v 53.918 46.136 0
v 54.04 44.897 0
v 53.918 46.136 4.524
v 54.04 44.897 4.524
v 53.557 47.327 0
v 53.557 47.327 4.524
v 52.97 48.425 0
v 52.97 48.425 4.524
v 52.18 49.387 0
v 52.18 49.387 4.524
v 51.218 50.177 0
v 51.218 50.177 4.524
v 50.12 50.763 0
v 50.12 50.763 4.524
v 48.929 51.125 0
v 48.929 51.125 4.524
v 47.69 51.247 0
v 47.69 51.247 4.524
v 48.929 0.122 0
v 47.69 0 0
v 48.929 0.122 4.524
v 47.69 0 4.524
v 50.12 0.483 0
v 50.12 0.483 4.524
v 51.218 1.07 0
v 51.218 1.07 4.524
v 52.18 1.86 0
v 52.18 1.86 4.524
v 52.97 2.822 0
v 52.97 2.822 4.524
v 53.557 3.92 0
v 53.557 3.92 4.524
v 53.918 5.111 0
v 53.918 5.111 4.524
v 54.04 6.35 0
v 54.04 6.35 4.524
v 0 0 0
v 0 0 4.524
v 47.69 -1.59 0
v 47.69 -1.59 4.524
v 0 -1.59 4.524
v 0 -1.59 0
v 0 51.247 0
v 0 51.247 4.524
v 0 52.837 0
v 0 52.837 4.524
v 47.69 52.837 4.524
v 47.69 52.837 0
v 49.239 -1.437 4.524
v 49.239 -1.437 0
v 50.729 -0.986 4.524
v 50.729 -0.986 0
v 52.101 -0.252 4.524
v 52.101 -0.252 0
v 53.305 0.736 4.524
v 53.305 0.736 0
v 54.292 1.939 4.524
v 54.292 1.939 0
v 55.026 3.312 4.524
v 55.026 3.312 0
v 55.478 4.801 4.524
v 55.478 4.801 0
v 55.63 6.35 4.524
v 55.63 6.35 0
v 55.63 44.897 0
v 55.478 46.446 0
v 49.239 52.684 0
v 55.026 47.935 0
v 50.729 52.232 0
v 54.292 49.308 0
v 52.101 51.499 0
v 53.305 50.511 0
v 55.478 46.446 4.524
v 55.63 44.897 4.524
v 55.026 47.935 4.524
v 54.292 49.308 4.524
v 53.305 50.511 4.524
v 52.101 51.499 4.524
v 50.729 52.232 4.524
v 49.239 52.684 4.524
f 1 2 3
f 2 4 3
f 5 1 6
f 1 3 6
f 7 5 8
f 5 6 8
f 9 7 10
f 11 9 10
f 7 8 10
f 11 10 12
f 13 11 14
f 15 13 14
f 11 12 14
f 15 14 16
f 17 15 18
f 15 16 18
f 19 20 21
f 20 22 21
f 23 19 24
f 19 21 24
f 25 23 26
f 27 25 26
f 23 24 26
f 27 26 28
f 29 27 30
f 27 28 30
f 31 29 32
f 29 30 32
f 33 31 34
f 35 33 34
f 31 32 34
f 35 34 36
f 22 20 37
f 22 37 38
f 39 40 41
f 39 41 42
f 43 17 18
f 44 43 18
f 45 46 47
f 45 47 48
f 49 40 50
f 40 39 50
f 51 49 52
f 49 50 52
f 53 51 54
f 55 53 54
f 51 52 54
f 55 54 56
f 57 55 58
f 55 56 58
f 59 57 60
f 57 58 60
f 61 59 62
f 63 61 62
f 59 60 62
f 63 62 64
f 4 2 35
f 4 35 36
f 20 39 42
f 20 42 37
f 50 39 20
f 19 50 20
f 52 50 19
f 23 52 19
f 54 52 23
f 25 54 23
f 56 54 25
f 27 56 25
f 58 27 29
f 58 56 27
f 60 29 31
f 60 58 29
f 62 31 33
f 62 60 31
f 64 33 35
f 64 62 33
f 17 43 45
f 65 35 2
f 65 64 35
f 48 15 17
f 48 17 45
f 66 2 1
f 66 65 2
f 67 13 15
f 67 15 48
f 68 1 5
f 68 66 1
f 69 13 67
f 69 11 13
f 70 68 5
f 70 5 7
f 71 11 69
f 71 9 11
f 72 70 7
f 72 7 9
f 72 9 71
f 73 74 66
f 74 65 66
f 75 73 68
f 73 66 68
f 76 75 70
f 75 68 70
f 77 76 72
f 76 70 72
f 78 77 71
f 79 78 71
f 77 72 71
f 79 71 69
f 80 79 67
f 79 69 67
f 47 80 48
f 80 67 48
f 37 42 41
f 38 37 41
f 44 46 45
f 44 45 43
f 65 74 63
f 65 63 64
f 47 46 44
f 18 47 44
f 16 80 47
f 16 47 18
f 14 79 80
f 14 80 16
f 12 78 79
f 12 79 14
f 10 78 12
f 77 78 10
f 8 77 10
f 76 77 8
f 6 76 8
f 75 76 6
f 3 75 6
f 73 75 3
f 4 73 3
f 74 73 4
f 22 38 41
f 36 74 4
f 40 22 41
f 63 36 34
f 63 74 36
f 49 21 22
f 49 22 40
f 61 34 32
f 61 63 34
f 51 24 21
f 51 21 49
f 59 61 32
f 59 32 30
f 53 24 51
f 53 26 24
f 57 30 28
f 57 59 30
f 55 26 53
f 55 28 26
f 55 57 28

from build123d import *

# Parameters (mm, degrees)
F1_W = 1.589909
F1_H = 4.523729


with BuildPart() as f2:
    # F2: sweep along a path in F0
    with BuildLine(Plane.XY) as f2_path:
        Line((0, 0), (47.690287, 0))
        ThreePointArc((47.690287, 0), (52.180415, 1.859872), (54.040287, 6.35))
        Line((54.040287, 6.35), (54.040287, 44.896792))
        ThreePointArc((54.040287, 44.896792), (52.180415, 49.38692), (47.690287, 51.246792))
        Line((47.690287, 51.246792), (0, 51.246792))
    # F1 (on Right) → F2 (sweep)
    with BuildSketch(Plane.YZ):
        with Locations((-0.794955, 2.261864)):
            Rectangle(F1_W, F1_H)
    sweep(path=f2_path.line)


solid = f2.part
